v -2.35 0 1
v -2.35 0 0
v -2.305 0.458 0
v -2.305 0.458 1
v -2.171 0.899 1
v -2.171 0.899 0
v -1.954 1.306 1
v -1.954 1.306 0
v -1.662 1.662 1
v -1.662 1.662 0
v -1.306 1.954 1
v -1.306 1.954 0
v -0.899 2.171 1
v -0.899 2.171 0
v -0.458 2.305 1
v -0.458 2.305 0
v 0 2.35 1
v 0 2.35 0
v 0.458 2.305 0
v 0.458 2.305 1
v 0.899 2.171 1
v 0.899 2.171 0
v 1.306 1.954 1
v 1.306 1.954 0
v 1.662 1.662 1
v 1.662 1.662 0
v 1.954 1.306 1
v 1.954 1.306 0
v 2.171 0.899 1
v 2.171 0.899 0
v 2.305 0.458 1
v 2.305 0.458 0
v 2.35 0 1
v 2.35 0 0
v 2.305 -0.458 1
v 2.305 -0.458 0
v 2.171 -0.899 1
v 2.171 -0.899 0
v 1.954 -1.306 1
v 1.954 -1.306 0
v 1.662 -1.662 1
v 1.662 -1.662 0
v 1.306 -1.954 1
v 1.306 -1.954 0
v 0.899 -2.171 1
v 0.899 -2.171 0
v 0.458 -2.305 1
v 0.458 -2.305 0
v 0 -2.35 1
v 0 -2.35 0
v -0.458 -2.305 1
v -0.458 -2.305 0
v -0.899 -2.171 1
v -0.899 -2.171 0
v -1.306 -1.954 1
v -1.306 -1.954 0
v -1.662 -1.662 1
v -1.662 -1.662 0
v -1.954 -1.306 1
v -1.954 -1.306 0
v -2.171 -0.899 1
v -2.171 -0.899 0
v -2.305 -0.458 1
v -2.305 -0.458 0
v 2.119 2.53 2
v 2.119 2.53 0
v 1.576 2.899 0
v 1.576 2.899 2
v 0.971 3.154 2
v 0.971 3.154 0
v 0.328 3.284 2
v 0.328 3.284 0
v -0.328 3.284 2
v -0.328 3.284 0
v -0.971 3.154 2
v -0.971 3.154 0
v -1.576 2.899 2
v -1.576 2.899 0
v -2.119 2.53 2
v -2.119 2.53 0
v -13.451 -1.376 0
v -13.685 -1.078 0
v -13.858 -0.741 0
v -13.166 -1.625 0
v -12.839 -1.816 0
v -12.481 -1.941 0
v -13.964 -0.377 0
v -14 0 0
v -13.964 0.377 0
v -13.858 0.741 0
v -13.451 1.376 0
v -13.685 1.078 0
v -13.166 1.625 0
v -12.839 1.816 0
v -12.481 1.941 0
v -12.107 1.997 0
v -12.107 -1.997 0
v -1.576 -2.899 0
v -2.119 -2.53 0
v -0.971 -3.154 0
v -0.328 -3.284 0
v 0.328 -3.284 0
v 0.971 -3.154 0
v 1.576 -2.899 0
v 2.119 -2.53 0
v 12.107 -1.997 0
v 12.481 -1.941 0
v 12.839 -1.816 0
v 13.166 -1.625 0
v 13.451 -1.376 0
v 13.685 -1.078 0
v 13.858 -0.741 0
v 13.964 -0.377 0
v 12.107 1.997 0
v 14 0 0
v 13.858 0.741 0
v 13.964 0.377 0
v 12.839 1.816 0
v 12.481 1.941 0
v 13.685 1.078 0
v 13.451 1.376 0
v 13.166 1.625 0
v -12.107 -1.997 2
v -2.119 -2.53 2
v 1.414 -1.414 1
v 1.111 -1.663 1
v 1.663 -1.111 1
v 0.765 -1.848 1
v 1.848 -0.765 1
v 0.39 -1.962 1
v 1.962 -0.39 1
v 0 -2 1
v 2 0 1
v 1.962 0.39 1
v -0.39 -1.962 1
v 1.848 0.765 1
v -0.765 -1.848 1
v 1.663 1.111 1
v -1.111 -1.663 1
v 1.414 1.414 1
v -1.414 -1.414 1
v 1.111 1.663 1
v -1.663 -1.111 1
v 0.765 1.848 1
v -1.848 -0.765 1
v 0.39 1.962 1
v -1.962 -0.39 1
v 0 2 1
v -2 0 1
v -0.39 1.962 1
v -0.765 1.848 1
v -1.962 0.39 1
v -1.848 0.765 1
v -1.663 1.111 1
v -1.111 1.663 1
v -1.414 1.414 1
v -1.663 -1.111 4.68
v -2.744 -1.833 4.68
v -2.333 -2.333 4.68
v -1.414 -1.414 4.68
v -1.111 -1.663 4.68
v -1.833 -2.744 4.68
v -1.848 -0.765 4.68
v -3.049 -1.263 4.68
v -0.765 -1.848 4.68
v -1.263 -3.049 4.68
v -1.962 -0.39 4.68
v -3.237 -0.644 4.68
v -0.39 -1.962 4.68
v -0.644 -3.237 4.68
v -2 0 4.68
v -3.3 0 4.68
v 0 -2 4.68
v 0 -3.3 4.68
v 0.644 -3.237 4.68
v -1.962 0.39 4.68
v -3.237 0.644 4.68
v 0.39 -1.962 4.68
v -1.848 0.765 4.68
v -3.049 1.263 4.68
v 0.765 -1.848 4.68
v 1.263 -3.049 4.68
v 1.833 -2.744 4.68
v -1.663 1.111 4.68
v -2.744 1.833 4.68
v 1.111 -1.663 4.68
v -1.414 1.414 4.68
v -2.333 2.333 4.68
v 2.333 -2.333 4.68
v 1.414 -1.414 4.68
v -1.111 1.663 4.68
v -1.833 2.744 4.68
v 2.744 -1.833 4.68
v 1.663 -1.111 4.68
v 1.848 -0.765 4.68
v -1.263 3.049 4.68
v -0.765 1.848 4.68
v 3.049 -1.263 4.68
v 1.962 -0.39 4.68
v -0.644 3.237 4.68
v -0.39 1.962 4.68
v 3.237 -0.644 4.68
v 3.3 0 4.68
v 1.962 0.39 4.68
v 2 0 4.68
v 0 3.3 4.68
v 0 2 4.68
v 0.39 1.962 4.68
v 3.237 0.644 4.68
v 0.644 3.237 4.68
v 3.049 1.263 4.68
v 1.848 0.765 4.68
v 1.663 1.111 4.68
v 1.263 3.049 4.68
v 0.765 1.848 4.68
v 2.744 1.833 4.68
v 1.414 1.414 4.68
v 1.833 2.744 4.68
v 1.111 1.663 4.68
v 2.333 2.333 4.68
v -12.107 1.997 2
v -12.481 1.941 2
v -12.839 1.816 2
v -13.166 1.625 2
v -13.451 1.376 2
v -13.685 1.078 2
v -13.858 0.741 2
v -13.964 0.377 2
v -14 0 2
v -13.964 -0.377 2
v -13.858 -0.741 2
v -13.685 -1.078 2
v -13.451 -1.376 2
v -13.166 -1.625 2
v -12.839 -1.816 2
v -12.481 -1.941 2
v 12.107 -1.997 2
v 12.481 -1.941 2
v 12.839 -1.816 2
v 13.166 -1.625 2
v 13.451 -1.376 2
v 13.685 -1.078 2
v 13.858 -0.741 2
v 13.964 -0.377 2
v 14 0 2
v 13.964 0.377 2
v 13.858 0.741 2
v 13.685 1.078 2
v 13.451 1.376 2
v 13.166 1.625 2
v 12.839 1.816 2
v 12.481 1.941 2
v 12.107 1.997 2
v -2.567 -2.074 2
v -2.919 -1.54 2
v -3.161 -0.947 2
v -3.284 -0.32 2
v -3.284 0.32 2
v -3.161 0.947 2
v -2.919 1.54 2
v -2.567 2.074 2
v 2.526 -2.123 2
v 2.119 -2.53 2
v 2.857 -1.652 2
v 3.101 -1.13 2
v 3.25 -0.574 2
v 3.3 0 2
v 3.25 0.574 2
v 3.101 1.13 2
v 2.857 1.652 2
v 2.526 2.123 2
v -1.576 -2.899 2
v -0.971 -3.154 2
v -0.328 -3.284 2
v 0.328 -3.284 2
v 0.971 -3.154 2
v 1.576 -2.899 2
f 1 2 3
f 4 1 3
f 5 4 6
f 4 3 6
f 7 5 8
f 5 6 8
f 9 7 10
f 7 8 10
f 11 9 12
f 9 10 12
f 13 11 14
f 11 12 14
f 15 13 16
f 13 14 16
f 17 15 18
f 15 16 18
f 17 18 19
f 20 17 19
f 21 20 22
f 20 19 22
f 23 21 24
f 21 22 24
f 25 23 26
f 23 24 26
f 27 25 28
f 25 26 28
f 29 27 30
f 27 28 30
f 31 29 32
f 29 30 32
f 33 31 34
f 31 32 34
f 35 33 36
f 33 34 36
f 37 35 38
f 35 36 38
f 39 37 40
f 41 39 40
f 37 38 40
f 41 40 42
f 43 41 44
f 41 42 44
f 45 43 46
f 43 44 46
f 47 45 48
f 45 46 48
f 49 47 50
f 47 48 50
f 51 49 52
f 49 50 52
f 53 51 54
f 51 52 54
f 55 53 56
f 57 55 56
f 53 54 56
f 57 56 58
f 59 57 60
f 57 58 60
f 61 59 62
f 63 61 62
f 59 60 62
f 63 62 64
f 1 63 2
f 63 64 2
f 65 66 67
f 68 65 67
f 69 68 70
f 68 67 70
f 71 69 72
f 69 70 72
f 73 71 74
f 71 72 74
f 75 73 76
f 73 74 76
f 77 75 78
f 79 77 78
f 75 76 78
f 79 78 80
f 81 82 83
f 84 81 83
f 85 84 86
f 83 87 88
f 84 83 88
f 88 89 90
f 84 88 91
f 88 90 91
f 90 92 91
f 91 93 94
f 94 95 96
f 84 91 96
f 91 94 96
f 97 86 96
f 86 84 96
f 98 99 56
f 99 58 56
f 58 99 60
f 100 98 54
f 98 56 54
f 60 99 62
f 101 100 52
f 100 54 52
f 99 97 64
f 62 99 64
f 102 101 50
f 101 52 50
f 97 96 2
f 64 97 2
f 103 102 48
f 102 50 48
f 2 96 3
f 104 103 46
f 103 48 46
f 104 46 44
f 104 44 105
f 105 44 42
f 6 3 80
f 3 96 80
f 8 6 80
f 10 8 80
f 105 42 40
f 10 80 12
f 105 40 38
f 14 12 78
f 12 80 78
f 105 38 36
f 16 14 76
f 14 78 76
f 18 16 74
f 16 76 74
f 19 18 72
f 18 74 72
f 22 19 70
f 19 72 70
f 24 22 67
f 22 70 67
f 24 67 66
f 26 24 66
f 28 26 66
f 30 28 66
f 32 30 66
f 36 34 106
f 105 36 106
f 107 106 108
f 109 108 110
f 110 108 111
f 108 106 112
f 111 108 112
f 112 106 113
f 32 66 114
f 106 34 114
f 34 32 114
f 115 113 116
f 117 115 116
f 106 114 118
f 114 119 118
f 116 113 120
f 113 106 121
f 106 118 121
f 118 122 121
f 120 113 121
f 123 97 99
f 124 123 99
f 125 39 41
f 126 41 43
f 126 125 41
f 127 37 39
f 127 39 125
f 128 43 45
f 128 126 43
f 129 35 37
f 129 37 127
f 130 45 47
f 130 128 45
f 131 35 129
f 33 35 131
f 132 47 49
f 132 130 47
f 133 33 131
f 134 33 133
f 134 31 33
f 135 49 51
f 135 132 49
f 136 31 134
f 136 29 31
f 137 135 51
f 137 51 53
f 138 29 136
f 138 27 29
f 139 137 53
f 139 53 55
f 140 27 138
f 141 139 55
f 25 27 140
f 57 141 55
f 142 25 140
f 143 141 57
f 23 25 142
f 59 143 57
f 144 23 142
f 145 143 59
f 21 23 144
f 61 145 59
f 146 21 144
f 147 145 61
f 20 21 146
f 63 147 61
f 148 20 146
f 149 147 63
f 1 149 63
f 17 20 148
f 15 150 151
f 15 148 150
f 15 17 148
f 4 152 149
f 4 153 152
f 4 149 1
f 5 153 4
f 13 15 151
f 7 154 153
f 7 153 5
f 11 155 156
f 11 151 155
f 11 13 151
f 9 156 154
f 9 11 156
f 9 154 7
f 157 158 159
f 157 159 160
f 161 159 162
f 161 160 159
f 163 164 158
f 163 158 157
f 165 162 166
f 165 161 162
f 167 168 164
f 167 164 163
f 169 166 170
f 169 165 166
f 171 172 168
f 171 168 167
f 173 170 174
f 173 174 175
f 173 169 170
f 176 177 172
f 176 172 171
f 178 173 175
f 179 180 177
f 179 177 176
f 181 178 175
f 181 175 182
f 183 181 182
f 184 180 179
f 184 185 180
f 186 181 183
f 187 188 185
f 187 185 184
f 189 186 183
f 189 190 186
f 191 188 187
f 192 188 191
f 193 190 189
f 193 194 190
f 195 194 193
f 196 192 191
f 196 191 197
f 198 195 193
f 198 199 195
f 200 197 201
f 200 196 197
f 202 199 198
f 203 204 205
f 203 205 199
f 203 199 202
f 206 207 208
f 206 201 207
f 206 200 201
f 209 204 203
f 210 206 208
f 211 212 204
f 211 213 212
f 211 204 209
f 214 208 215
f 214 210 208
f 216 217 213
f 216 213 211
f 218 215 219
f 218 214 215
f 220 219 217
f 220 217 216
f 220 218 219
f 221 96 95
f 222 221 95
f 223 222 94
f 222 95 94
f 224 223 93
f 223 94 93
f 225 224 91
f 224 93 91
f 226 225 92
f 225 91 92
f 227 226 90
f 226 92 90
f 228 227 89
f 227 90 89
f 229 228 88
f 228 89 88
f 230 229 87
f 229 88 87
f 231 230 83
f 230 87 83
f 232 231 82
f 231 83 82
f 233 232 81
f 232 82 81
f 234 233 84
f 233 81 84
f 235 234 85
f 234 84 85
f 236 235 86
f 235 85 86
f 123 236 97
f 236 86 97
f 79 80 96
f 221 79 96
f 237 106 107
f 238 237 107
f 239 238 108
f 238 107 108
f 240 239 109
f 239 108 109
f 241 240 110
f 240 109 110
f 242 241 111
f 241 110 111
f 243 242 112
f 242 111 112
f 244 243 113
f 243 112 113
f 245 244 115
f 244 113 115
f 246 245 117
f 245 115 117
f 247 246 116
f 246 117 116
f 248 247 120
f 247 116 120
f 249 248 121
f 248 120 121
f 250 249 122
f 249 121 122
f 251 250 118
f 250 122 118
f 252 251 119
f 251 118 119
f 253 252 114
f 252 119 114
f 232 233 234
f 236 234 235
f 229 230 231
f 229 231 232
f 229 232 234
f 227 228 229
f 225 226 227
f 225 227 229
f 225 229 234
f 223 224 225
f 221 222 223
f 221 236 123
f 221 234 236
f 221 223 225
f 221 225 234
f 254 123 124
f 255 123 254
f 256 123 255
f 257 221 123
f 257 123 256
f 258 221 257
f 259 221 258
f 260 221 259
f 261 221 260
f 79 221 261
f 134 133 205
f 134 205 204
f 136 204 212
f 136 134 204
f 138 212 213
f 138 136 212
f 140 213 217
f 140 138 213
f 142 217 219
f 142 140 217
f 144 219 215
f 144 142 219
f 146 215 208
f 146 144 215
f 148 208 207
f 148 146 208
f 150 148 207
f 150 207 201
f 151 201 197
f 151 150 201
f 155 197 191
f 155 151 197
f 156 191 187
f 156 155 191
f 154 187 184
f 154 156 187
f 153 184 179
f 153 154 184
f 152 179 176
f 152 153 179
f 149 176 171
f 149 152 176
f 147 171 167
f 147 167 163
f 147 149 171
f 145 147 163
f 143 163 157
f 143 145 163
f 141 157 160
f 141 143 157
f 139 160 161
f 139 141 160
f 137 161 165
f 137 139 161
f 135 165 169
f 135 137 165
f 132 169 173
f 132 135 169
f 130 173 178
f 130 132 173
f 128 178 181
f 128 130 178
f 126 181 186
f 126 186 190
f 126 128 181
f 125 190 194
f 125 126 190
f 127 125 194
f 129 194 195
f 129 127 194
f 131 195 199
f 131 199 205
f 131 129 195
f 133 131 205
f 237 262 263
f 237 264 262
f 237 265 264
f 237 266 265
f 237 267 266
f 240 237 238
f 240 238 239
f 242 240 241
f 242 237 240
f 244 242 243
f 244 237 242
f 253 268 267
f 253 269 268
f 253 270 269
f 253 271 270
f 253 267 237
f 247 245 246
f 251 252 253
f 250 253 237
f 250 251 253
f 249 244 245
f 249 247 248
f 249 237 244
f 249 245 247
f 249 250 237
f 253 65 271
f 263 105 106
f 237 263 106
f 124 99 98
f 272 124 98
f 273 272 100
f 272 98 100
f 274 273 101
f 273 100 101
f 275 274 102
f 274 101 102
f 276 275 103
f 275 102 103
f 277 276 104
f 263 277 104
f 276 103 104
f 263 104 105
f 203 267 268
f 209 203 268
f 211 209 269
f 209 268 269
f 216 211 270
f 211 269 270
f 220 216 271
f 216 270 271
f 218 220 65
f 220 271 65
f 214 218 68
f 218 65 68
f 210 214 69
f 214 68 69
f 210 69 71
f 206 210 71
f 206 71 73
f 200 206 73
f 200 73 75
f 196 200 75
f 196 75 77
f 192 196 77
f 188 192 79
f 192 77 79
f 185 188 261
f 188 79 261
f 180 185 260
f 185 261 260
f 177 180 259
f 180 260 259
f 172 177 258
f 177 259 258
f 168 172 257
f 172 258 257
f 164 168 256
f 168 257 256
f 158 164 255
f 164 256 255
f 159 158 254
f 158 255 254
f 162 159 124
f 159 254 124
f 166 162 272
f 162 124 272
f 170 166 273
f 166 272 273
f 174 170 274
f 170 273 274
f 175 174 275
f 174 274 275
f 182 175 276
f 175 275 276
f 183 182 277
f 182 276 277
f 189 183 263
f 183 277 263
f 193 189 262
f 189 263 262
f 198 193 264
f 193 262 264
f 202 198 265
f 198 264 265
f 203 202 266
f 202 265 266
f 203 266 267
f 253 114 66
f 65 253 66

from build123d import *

# Parameters (mm, degrees)
SKETCH_1_R                 = 2
EXTRUDE_3_DEPTH            = 2
CROQUIS1_R                 = 3.3
CROQUIS1_R_2               = 2
SALIENTE_EXTRUIR1_DEPTH    = 2.68
SKETCH_5_R                 = 2.5
EXTRUDE_7_DEPTH            = 1
CROQUIS2_R                 = 1.25
CORTAR_EXTRUIR1_DEPTH      = 4.68
CORTAR_EXTRUIR1_DEPTH_BACK = 2
CROQUIS3_R                 = 2.35
CORTAR_EXTRUIR2_DEPTH      = 1


with BuildPart() as part:
    # Эскиз1 → Бобышка-Вытянуть3 (new body)
    with BuildSketch(Plane.XY):
        with BuildLine():
            Line((-2.118749631, 2.53), (-12.106546701, 1.997159934))
            ThreePointArc((-12.106546701, 1.997159934), (-14, 0), (-12.106546701, -1.997159934))
            Line((-12.106546701, -1.997159934), (-2.118749631, -2.53))
            ThreePointArc((-2.118749631, -2.53), (0, -3.3), (2.118749631, -2.53))
            Line((2.118749631, -2.53), (12.106546701, -1.997159934))
            ThreePointArc((12.106546701, -1.997159934), (14, 0), (12.106546701, 1.997159934))
            Line((12.106546701, 1.997159934), (2.118749631, 2.53))
            ThreePointArc((2.118749631, 2.53), (0, 3.3), (-2.118749631, 2.53))
        make_face()
        Circle(SKETCH_1_R, mode=Mode.SUBTRACT)
    extrude(amount=EXTRUDE_3_DEPTH)

    # Croquis1 → Saliente-Extruir1 (add)
    with BuildSketch(Plane.XY.offset(2)):
        Circle(CROQUIS1_R)
        Circle(CROQUIS1_R_2, mode=Mode.SUBTRACT)
    extrude(amount=SALIENTE_EXTRUIR1_DEPTH)

    # Эскиз5 → Бобышка-Вытянуть7 (add)
    with BuildSketch(Plane(origin=(0, 0, 0), x_dir=(-1, 0, 0), z_dir=(0, 0, -1))):
        Circle(SKETCH_5_R)
    extrude(amount=-EXTRUDE_7_DEPTH)

    # Croquis2 → Cortar-Extruir1 (cut, two sides)
    with BuildSketch(Plane.XY.offset(1)) as cortar_extruir1_sk:
        Circle(CROQUIS2_R)
    extrude(amount=CORTAR_EXTRUIR1_DEPTH, mode=Mode.SUBTRACT)
    extrude(cortar_extruir1_sk.sketch, amount=-CORTAR_EXTRUIR1_DEPTH_BACK, mode=Mode.SUBTRACT)

    # Croquis3 → Cortar-Extruir2 (cut)
    with BuildSketch(Plane(origin=(0, 0, 0), x_dir=(-1, 0, 0), z_dir=(0, 0, -1))):
        Circle(CROQUIS3_R)
    extrude(amount=-CORTAR_EXTRUIR2_DEPTH, mode=Mode.SUBTRACT)


solid = part.part
